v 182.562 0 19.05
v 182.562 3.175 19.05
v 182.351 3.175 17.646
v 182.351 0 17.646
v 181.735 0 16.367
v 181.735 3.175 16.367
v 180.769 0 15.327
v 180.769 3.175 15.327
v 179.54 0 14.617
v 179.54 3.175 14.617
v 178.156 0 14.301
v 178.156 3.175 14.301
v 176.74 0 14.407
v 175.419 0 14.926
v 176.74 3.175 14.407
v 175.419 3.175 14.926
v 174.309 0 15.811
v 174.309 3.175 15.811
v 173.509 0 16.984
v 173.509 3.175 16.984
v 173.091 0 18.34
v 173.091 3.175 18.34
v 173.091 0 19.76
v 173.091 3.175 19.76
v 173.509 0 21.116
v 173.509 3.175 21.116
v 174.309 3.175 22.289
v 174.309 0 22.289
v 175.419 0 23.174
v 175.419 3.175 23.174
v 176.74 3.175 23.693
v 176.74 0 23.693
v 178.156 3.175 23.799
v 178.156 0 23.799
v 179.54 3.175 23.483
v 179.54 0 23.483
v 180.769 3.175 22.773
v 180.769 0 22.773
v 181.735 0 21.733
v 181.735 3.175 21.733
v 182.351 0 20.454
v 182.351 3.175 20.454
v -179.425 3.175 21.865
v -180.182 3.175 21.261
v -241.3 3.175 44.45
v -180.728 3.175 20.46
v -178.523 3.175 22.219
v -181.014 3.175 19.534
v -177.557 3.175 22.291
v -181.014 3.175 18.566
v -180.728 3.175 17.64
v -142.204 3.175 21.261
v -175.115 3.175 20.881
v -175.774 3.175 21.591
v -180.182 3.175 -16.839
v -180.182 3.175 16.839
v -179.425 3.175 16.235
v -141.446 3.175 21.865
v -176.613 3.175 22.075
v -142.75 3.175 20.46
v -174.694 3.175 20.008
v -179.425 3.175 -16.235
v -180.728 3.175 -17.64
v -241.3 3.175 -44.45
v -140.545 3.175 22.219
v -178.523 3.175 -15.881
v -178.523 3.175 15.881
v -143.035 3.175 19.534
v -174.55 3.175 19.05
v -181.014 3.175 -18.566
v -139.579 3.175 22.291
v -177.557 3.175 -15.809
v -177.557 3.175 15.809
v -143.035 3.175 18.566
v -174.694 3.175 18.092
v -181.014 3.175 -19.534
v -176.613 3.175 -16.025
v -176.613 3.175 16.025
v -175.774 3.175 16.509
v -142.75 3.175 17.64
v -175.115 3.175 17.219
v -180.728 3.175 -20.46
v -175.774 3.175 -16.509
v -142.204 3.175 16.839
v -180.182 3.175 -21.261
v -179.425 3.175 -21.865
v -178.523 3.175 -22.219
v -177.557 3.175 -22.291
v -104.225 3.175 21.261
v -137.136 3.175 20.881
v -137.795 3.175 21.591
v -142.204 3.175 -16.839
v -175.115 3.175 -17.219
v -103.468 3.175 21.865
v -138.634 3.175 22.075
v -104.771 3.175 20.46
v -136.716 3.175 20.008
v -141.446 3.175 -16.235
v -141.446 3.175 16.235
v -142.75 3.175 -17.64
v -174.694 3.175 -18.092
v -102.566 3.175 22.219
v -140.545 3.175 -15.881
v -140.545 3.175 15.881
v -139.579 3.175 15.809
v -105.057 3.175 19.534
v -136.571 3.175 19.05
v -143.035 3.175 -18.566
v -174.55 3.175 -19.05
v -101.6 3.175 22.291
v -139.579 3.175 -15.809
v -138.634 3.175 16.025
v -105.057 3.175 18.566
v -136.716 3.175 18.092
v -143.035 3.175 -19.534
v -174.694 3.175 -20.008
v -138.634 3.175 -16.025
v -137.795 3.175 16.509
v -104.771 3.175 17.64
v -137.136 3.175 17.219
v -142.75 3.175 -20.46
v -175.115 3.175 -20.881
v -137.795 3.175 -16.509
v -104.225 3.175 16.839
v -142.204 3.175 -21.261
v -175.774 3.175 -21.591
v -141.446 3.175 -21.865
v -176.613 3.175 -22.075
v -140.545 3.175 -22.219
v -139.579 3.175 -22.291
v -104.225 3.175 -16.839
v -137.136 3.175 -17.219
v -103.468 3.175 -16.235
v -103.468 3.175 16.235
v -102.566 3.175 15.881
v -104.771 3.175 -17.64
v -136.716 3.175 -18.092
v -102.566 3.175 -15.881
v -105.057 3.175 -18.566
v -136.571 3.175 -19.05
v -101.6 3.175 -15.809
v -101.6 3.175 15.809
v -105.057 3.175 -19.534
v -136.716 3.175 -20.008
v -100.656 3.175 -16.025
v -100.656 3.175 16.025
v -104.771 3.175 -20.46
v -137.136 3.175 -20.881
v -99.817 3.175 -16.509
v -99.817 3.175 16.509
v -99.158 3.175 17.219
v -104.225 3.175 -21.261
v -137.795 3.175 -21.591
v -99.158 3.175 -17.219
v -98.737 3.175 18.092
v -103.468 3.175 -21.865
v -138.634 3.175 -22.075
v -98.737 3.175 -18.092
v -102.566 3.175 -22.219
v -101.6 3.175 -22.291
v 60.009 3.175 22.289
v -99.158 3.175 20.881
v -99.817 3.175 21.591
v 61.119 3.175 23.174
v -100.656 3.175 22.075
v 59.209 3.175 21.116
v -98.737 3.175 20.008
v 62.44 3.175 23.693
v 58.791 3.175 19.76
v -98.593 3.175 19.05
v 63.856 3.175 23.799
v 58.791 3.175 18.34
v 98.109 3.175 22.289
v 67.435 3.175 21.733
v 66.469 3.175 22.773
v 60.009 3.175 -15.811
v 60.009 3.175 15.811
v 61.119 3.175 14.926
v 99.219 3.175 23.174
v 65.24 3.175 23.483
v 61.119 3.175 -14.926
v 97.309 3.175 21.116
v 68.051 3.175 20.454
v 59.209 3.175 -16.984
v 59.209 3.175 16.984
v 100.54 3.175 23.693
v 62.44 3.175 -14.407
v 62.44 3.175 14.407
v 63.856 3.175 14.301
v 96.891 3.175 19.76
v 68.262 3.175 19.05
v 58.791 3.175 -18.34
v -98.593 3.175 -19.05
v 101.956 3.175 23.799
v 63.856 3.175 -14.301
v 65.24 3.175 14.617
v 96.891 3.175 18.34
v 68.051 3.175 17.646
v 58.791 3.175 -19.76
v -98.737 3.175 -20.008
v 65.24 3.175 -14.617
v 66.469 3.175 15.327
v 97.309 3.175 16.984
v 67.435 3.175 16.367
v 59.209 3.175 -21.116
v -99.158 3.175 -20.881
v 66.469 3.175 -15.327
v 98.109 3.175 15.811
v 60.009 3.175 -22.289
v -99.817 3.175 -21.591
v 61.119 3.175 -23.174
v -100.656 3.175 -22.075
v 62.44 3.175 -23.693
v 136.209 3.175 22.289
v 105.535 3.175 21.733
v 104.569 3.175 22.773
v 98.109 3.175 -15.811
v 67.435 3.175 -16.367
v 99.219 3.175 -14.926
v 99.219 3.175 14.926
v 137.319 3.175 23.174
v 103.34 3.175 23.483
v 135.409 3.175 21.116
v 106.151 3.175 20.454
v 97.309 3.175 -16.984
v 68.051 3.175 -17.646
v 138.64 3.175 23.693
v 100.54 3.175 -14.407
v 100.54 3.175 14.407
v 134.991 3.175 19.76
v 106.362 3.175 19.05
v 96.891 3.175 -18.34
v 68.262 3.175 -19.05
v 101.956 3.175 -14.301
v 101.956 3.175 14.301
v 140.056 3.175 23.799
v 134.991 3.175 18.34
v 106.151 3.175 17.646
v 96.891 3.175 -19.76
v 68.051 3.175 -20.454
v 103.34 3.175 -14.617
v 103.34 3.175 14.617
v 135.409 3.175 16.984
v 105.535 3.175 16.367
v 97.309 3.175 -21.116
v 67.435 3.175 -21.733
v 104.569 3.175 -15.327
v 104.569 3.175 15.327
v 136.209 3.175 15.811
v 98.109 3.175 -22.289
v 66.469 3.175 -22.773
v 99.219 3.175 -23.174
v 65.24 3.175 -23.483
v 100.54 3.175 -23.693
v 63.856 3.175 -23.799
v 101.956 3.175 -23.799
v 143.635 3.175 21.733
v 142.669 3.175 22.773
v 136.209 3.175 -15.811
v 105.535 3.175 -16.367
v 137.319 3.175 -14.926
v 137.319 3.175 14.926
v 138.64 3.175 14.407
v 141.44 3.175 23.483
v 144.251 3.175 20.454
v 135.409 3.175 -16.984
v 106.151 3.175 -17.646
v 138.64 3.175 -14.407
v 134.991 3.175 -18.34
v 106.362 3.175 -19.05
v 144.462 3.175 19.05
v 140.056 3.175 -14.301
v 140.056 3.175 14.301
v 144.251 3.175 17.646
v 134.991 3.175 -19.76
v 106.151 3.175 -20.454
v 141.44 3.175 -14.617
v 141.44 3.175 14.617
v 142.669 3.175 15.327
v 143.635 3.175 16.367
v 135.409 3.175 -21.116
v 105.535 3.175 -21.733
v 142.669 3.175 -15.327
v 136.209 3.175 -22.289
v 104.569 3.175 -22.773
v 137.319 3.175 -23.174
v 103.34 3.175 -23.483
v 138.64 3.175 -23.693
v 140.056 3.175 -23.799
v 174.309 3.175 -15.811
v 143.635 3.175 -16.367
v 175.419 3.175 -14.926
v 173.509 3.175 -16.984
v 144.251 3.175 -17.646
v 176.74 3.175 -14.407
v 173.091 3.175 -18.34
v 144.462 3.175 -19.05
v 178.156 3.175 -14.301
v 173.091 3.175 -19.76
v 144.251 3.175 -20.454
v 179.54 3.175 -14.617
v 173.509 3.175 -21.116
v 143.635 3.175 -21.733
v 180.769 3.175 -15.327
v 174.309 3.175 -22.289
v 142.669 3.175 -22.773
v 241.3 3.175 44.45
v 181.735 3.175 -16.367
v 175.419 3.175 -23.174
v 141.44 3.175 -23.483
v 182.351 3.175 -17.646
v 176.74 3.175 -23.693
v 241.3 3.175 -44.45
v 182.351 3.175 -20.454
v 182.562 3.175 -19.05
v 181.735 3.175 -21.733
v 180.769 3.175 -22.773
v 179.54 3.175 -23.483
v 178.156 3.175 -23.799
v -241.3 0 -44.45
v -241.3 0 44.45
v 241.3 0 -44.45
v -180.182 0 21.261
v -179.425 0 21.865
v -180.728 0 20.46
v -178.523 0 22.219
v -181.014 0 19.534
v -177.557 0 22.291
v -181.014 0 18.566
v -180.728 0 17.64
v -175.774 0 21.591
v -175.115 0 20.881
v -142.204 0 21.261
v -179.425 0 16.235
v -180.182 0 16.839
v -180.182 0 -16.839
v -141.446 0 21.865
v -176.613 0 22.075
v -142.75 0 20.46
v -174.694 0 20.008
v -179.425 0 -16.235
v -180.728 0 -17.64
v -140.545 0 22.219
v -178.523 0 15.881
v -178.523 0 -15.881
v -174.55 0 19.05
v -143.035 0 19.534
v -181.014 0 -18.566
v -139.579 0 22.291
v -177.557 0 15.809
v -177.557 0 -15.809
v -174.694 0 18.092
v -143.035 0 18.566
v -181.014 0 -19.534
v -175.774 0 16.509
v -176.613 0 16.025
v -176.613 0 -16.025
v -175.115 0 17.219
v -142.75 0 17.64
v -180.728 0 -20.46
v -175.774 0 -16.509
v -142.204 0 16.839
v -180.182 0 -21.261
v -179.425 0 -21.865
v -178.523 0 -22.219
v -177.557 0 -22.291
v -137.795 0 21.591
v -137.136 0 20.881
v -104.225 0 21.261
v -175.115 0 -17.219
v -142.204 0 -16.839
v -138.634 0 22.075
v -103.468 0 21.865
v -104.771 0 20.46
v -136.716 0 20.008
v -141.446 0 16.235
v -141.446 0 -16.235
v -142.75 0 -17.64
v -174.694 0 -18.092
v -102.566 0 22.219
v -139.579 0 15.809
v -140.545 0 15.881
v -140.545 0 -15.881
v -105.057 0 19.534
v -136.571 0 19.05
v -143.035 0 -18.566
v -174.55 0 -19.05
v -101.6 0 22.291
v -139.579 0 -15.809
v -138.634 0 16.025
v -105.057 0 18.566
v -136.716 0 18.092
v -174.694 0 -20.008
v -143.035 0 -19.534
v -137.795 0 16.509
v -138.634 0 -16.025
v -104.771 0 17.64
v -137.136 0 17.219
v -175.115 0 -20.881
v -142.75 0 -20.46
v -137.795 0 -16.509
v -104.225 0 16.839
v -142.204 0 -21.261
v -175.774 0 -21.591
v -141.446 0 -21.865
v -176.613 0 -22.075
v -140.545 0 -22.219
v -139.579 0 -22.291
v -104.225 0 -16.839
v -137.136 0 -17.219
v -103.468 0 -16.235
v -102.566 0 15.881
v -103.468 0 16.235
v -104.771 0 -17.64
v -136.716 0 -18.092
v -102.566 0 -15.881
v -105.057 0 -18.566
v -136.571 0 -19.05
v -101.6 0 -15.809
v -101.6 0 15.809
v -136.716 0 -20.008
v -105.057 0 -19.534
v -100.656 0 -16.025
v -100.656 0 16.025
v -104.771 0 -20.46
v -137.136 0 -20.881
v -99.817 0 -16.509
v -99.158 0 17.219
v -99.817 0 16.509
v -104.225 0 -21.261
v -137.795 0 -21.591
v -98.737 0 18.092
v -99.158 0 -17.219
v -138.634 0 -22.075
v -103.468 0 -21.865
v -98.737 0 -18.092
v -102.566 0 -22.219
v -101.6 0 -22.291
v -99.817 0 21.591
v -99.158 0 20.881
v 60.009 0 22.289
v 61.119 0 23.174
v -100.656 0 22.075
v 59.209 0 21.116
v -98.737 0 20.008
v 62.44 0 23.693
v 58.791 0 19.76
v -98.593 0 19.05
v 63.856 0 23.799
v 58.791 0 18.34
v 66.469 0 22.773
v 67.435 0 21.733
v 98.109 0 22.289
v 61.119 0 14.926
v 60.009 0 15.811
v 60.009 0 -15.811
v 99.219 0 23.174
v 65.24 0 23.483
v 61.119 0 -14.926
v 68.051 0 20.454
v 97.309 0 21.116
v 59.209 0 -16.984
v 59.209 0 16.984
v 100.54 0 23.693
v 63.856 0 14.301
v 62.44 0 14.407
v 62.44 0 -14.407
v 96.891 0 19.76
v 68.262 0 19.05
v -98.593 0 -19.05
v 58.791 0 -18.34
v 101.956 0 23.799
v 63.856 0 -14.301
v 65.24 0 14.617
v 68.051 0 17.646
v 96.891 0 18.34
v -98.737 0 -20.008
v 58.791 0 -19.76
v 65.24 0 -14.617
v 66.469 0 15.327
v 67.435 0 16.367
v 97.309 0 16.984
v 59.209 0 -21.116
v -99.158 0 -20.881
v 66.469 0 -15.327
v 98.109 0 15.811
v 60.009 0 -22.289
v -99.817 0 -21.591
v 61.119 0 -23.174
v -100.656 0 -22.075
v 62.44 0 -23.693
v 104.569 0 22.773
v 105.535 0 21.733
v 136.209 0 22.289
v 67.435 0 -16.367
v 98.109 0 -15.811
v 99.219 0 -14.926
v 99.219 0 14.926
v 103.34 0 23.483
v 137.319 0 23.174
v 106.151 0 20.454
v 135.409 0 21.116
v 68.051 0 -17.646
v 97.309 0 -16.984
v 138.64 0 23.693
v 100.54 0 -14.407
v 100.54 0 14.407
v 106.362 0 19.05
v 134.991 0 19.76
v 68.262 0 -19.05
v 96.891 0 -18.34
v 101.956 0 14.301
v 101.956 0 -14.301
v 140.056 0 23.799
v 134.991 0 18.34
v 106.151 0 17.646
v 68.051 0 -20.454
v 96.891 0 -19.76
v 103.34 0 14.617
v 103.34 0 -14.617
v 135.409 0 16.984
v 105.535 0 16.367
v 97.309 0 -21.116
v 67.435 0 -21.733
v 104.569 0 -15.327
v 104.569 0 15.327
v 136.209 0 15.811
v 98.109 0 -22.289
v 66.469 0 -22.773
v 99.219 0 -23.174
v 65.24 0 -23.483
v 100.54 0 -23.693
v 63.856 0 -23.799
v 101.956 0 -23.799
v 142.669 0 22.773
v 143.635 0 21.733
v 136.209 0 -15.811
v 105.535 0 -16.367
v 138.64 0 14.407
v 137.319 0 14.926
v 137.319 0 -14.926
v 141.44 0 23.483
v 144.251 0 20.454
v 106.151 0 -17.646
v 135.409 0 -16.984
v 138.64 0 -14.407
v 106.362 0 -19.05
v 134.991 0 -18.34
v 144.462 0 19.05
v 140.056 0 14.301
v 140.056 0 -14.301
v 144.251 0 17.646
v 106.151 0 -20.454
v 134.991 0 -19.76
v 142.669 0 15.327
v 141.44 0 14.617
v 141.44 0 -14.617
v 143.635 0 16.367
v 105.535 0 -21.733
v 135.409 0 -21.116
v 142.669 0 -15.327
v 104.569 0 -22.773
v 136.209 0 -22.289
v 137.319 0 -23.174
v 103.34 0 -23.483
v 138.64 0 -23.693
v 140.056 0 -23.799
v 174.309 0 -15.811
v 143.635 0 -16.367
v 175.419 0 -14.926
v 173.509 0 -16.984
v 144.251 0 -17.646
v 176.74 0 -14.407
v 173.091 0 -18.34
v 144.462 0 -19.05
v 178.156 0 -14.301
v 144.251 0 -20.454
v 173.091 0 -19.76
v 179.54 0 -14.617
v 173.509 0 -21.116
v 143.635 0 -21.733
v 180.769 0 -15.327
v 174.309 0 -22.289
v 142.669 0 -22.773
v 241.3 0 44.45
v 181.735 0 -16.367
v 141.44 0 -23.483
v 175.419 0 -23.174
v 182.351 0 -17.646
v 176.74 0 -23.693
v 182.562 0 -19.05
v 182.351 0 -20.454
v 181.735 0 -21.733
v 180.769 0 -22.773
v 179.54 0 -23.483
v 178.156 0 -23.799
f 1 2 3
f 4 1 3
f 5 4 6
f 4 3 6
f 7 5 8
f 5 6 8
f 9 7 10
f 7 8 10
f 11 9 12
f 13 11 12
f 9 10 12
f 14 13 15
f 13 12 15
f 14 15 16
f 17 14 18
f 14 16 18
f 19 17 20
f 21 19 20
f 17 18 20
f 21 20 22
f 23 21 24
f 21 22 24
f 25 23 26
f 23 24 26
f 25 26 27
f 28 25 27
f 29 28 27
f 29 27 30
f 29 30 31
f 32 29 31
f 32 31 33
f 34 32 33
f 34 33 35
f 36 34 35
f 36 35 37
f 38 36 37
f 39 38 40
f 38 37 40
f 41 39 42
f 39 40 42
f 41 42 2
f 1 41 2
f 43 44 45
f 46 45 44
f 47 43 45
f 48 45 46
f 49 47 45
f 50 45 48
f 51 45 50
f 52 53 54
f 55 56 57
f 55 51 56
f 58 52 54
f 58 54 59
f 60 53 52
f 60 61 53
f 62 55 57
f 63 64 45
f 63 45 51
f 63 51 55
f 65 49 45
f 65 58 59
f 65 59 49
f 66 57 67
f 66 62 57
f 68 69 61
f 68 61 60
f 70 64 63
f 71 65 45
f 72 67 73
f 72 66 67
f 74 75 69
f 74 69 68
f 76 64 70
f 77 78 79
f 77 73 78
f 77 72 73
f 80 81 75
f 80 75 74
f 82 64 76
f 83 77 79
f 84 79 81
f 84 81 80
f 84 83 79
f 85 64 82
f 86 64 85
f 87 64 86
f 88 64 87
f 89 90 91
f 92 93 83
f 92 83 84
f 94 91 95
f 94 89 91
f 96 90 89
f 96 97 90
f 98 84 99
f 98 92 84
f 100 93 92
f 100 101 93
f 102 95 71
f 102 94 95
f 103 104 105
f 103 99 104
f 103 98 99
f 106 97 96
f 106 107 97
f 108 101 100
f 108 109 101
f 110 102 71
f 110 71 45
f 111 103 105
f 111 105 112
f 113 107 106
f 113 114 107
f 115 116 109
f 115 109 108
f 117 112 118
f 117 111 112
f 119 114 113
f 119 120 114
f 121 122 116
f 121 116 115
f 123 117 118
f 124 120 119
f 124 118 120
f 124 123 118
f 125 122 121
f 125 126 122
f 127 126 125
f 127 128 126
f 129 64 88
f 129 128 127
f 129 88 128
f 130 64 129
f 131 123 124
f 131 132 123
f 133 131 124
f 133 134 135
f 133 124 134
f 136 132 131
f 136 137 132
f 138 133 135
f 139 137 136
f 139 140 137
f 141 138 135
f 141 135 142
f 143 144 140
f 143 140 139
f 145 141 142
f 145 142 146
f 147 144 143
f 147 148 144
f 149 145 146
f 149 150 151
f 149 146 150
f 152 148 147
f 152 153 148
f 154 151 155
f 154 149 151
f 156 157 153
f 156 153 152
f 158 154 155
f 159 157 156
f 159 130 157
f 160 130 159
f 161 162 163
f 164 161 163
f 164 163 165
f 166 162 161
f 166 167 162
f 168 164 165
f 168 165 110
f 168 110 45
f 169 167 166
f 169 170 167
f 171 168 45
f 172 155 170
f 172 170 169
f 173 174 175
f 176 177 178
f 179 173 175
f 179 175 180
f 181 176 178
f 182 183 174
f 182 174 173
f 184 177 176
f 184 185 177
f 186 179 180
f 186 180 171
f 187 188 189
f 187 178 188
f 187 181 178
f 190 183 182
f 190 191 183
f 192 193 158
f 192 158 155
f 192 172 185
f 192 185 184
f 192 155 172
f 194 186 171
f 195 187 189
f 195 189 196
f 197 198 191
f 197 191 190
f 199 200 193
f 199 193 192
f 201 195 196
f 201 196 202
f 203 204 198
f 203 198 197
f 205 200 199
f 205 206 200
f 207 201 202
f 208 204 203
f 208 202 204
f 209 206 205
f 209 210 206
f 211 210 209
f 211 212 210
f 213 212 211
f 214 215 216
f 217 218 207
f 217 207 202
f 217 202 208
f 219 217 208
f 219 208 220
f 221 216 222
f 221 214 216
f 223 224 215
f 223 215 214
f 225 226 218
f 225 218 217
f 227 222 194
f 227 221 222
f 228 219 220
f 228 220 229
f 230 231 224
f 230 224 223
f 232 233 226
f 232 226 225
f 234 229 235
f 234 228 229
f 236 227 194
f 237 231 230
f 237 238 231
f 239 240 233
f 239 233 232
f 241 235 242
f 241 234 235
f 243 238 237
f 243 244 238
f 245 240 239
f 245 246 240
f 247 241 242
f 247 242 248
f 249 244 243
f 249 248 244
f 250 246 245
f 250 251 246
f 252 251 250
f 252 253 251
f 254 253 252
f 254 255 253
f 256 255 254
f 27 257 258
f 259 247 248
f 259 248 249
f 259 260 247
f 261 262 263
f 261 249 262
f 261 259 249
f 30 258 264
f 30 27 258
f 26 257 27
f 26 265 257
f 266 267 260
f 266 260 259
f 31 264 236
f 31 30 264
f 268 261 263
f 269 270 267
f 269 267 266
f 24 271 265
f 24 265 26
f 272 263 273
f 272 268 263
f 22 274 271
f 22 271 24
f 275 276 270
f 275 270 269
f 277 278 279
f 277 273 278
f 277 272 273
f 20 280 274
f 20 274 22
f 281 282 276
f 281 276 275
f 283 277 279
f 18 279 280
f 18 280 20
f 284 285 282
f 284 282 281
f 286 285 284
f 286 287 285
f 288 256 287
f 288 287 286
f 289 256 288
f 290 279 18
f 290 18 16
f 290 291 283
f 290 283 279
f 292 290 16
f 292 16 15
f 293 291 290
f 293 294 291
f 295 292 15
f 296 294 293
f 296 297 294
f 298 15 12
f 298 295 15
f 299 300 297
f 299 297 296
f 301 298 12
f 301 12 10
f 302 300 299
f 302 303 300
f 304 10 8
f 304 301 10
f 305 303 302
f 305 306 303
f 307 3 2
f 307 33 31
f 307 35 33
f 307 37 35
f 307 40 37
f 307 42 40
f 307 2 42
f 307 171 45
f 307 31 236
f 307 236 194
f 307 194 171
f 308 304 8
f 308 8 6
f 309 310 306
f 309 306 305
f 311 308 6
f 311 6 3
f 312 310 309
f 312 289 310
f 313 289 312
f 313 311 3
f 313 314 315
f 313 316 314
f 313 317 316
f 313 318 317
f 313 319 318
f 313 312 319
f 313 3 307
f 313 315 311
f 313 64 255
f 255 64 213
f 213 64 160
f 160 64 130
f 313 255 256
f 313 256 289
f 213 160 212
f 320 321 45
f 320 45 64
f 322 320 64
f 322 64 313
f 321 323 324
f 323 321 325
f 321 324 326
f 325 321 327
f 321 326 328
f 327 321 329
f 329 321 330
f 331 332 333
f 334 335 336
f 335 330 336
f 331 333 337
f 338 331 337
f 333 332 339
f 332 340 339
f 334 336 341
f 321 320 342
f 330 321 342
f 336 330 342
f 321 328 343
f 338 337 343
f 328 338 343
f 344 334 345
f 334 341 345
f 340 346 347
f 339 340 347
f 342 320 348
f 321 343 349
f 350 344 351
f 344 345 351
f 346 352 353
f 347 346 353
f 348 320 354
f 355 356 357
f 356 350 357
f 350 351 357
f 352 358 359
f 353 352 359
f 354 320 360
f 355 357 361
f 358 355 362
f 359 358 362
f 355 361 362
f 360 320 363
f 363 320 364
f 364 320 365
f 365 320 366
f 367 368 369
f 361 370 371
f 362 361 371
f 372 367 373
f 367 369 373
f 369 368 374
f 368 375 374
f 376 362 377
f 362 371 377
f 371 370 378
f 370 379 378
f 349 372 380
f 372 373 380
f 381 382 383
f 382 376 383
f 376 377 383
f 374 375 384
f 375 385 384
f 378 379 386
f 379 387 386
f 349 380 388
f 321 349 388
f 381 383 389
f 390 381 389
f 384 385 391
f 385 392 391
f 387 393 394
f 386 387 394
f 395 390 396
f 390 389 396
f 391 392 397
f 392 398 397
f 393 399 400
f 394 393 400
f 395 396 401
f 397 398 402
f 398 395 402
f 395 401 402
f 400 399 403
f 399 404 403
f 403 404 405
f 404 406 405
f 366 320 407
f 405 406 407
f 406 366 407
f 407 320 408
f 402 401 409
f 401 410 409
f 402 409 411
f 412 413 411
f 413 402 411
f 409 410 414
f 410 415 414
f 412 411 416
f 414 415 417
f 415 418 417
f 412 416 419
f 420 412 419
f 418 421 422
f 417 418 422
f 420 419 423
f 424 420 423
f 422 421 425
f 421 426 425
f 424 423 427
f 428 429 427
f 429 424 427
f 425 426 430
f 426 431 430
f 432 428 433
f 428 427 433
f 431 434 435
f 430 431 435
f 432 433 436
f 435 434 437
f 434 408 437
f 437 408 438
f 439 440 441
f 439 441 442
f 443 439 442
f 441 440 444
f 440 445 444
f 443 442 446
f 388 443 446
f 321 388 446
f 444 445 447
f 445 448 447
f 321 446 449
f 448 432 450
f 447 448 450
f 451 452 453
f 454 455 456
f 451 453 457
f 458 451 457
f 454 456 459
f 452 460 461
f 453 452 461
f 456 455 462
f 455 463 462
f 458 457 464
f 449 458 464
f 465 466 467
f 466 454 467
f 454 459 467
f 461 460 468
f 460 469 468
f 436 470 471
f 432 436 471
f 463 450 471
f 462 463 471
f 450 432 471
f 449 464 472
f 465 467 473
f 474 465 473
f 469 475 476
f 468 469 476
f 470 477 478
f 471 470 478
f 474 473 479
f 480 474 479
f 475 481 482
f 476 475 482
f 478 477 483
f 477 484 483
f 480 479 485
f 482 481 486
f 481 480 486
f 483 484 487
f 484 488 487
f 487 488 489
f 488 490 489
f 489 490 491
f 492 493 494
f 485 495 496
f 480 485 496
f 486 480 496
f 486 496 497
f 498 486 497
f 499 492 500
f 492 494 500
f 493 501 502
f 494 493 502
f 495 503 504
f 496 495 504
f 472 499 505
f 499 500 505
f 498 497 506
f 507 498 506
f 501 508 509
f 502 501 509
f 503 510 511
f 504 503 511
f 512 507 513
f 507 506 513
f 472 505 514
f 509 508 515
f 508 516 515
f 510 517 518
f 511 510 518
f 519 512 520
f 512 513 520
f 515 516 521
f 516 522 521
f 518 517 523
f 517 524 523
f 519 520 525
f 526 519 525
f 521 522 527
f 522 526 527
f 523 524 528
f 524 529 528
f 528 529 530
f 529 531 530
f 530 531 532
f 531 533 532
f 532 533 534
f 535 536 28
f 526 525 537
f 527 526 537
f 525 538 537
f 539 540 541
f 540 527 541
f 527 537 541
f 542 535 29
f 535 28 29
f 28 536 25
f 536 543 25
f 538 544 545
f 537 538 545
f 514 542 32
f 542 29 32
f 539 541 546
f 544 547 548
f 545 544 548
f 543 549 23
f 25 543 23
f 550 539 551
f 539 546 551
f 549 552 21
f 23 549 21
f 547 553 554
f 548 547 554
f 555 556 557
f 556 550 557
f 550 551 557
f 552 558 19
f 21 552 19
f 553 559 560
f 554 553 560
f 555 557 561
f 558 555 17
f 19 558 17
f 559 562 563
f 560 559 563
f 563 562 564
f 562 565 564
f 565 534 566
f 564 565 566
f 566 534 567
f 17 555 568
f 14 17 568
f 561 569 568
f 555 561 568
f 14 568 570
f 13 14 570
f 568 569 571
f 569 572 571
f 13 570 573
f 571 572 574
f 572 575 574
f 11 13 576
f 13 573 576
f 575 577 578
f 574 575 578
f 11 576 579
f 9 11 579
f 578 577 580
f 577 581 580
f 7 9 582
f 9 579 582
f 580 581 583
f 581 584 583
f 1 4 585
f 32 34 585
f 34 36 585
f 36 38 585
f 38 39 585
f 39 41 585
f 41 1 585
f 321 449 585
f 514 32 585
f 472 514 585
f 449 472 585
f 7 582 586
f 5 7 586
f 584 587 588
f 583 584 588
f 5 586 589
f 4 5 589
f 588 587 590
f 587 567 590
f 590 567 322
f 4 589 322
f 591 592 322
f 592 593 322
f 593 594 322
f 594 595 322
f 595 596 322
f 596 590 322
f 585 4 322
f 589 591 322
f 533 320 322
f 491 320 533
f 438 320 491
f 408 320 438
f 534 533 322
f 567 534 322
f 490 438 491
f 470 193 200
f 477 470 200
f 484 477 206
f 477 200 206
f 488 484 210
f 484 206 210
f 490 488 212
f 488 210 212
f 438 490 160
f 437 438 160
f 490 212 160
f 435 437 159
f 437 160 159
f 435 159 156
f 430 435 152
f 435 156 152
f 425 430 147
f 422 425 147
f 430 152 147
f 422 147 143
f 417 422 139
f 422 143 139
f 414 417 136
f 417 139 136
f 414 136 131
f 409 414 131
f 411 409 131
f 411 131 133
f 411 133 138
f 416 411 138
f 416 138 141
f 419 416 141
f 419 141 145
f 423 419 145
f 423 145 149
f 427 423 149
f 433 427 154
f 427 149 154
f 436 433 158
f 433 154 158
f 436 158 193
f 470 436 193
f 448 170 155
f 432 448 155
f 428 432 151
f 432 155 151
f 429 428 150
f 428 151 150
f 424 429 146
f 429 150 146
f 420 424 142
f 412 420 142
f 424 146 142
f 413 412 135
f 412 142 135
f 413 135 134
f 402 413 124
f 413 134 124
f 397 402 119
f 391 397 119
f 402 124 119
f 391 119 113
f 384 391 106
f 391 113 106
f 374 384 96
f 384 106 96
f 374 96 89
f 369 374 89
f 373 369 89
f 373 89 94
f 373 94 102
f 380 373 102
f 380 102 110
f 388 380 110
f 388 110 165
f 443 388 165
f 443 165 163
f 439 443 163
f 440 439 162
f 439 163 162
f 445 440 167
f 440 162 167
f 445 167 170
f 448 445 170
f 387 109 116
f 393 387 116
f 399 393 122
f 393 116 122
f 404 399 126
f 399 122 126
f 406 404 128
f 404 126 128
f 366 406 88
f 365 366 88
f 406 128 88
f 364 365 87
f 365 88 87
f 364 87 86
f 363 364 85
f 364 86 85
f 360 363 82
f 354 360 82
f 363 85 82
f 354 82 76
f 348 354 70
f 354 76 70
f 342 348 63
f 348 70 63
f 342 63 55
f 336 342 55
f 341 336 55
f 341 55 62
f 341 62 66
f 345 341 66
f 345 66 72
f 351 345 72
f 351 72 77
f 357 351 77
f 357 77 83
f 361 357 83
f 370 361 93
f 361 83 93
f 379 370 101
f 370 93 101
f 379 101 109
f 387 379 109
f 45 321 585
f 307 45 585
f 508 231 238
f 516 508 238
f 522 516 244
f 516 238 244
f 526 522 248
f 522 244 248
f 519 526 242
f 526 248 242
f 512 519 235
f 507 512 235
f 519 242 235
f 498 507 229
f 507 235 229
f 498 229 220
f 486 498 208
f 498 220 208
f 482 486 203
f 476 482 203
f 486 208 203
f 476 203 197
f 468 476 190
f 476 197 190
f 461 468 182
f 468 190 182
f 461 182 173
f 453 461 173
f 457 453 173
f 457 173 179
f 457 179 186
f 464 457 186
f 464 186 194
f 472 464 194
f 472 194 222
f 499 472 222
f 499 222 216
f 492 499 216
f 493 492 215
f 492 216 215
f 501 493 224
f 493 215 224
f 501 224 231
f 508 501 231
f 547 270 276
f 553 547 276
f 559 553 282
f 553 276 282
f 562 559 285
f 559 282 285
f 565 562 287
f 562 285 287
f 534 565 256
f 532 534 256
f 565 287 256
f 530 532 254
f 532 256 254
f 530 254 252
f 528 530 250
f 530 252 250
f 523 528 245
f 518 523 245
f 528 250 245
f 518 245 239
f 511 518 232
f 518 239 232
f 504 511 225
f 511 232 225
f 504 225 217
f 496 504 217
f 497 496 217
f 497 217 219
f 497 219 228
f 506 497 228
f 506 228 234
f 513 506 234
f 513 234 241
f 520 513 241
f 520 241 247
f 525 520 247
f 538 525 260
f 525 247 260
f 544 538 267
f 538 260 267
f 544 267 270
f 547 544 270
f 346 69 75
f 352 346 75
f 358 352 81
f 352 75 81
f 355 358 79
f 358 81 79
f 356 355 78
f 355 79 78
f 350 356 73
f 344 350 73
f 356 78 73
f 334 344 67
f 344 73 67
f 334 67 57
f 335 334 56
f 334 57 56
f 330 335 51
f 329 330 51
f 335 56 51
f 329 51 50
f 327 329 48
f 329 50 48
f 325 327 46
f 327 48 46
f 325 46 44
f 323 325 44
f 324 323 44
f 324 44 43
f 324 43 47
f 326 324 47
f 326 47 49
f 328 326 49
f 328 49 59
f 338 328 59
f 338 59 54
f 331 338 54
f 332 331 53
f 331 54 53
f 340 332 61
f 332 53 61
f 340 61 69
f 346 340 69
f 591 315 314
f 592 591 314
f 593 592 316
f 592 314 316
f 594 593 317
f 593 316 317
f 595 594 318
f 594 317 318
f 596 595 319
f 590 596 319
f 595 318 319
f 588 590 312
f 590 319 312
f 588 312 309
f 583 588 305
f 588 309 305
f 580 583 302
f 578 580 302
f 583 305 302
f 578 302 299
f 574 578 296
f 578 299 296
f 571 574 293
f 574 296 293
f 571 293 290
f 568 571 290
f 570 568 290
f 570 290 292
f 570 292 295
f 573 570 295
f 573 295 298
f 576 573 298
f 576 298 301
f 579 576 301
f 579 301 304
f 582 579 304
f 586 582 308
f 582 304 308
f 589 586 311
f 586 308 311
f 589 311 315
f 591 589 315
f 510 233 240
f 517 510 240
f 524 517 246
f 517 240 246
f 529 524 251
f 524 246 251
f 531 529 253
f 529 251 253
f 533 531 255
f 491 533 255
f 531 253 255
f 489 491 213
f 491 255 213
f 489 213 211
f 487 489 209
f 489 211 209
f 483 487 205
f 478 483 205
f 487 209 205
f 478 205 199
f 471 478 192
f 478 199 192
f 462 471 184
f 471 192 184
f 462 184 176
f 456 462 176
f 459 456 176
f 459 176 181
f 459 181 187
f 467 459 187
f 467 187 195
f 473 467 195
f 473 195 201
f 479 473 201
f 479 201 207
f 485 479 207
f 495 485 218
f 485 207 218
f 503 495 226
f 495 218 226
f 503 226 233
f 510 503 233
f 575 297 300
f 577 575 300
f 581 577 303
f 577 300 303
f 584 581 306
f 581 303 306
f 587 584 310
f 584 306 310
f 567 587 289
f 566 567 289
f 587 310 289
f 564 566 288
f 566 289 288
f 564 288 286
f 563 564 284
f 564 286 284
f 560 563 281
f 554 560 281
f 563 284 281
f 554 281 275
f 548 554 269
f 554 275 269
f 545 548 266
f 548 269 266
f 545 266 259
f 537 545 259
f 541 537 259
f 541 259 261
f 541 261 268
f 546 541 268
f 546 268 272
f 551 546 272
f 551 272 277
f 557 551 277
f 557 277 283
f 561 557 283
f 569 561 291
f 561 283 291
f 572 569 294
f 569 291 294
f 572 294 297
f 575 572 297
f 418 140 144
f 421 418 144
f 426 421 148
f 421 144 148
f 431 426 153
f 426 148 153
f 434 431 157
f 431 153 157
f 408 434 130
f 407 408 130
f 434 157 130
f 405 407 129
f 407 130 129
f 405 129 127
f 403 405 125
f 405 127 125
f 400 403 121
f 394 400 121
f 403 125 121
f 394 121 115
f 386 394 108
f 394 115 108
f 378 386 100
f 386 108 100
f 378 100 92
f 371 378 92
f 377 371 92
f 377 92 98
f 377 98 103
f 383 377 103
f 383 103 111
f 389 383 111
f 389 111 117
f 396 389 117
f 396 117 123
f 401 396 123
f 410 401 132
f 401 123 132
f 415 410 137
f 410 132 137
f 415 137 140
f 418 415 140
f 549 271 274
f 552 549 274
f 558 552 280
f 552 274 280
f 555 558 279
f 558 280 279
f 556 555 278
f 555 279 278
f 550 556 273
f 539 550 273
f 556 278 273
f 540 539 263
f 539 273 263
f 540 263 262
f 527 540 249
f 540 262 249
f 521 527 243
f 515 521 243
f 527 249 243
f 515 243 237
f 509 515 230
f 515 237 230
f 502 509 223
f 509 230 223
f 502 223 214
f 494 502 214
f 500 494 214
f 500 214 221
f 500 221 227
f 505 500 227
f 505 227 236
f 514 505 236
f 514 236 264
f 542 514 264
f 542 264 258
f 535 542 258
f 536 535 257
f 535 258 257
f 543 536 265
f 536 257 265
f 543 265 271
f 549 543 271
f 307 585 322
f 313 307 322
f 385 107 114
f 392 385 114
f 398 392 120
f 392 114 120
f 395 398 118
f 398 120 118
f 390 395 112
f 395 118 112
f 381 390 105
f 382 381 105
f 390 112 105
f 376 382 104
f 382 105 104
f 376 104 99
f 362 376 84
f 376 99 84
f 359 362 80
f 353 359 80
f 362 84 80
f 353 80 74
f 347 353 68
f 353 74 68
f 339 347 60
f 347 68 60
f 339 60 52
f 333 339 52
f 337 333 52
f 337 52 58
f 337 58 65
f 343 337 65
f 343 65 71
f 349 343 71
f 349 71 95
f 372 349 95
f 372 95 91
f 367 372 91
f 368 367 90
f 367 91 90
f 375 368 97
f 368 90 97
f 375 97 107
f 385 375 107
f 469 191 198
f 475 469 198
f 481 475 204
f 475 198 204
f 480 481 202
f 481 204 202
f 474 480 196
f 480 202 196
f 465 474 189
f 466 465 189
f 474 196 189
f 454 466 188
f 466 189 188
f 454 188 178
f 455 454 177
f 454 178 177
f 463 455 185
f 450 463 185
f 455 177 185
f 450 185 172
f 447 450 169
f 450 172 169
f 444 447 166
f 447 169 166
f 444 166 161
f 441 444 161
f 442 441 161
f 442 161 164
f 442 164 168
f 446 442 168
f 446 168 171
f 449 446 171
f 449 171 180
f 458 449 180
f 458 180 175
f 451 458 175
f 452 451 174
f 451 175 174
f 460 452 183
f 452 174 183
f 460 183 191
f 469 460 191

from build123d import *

# Parameters (mm, degrees)
SKETCH1_W           = 482.6
SKETCH1_H           = 88.9
BOSS_EXTRUDE1_DEPTH = 3.175
SKETCH2_R           = 3.25
SKETCH2_R_2         = 4.7625
CUT_EXTRUDE1_DEPTH  = 3.175


with BuildPart() as part:
    # Sketch1 → Boss-Extrude1 (new body)
    with BuildSketch(Plane(origin=(0, 0, 0), x_dir=(1, 0, 0), z_dir=(0, 1, 0))):
        Rectangle(SKETCH1_W, SKETCH1_H)
    extrude(amount=BOSS_EXTRUDE1_DEPTH)

    # Sketch2 → Cut-Extrude1 (cut)
    with BuildSketch(Plane(origin=(0, 3.175, 0), x_dir=(1, 0, 0), z_dir=(0, 1, 0))):
        with Locations((-101.842969122, -19.05)):
            Circle(SKETCH2_R)
        with Locations((-139.821484561, -19.05)):
            Circle(SKETCH2_R)
        with Locations((-177.8, -19.05)):
            Circle(SKETCH2_R)
        with Locations((-139.821484561, 19.05)):
            Circle(SKETCH2_R)
        with Locations((-177.8, 19.05)):
            Circle(SKETCH2_R)
        with Locations((-101.842969122, 19.05)):
            Circle(SKETCH2_R)
        with Locations((177.8, -19.05)):
            Circle(SKETCH2_R_2)
        with Locations((139.7, -19.05)):
            Circle(SKETCH2_R_2)
        with Locations((101.6, -19.05)):
            Circle(SKETCH2_R_2)
        with Locations((63.5, -19.05)):
            Circle(SKETCH2_R_2)
        with Locations((139.7, 19.05)):
            Circle(SKETCH2_R_2)
        with Locations((101.6, 19.05)):
            Circle(SKETCH2_R_2)
        with Locations((63.5, 19.05)):
            Circle(SKETCH2_R_2)
        with Locations((177.8, 19.05)):
            Circle(SKETCH2_R_2)
    extrude(amount=-CUT_EXTRUDE1_DEPTH, mode=Mode.SUBTRACT)


solid = part.part
